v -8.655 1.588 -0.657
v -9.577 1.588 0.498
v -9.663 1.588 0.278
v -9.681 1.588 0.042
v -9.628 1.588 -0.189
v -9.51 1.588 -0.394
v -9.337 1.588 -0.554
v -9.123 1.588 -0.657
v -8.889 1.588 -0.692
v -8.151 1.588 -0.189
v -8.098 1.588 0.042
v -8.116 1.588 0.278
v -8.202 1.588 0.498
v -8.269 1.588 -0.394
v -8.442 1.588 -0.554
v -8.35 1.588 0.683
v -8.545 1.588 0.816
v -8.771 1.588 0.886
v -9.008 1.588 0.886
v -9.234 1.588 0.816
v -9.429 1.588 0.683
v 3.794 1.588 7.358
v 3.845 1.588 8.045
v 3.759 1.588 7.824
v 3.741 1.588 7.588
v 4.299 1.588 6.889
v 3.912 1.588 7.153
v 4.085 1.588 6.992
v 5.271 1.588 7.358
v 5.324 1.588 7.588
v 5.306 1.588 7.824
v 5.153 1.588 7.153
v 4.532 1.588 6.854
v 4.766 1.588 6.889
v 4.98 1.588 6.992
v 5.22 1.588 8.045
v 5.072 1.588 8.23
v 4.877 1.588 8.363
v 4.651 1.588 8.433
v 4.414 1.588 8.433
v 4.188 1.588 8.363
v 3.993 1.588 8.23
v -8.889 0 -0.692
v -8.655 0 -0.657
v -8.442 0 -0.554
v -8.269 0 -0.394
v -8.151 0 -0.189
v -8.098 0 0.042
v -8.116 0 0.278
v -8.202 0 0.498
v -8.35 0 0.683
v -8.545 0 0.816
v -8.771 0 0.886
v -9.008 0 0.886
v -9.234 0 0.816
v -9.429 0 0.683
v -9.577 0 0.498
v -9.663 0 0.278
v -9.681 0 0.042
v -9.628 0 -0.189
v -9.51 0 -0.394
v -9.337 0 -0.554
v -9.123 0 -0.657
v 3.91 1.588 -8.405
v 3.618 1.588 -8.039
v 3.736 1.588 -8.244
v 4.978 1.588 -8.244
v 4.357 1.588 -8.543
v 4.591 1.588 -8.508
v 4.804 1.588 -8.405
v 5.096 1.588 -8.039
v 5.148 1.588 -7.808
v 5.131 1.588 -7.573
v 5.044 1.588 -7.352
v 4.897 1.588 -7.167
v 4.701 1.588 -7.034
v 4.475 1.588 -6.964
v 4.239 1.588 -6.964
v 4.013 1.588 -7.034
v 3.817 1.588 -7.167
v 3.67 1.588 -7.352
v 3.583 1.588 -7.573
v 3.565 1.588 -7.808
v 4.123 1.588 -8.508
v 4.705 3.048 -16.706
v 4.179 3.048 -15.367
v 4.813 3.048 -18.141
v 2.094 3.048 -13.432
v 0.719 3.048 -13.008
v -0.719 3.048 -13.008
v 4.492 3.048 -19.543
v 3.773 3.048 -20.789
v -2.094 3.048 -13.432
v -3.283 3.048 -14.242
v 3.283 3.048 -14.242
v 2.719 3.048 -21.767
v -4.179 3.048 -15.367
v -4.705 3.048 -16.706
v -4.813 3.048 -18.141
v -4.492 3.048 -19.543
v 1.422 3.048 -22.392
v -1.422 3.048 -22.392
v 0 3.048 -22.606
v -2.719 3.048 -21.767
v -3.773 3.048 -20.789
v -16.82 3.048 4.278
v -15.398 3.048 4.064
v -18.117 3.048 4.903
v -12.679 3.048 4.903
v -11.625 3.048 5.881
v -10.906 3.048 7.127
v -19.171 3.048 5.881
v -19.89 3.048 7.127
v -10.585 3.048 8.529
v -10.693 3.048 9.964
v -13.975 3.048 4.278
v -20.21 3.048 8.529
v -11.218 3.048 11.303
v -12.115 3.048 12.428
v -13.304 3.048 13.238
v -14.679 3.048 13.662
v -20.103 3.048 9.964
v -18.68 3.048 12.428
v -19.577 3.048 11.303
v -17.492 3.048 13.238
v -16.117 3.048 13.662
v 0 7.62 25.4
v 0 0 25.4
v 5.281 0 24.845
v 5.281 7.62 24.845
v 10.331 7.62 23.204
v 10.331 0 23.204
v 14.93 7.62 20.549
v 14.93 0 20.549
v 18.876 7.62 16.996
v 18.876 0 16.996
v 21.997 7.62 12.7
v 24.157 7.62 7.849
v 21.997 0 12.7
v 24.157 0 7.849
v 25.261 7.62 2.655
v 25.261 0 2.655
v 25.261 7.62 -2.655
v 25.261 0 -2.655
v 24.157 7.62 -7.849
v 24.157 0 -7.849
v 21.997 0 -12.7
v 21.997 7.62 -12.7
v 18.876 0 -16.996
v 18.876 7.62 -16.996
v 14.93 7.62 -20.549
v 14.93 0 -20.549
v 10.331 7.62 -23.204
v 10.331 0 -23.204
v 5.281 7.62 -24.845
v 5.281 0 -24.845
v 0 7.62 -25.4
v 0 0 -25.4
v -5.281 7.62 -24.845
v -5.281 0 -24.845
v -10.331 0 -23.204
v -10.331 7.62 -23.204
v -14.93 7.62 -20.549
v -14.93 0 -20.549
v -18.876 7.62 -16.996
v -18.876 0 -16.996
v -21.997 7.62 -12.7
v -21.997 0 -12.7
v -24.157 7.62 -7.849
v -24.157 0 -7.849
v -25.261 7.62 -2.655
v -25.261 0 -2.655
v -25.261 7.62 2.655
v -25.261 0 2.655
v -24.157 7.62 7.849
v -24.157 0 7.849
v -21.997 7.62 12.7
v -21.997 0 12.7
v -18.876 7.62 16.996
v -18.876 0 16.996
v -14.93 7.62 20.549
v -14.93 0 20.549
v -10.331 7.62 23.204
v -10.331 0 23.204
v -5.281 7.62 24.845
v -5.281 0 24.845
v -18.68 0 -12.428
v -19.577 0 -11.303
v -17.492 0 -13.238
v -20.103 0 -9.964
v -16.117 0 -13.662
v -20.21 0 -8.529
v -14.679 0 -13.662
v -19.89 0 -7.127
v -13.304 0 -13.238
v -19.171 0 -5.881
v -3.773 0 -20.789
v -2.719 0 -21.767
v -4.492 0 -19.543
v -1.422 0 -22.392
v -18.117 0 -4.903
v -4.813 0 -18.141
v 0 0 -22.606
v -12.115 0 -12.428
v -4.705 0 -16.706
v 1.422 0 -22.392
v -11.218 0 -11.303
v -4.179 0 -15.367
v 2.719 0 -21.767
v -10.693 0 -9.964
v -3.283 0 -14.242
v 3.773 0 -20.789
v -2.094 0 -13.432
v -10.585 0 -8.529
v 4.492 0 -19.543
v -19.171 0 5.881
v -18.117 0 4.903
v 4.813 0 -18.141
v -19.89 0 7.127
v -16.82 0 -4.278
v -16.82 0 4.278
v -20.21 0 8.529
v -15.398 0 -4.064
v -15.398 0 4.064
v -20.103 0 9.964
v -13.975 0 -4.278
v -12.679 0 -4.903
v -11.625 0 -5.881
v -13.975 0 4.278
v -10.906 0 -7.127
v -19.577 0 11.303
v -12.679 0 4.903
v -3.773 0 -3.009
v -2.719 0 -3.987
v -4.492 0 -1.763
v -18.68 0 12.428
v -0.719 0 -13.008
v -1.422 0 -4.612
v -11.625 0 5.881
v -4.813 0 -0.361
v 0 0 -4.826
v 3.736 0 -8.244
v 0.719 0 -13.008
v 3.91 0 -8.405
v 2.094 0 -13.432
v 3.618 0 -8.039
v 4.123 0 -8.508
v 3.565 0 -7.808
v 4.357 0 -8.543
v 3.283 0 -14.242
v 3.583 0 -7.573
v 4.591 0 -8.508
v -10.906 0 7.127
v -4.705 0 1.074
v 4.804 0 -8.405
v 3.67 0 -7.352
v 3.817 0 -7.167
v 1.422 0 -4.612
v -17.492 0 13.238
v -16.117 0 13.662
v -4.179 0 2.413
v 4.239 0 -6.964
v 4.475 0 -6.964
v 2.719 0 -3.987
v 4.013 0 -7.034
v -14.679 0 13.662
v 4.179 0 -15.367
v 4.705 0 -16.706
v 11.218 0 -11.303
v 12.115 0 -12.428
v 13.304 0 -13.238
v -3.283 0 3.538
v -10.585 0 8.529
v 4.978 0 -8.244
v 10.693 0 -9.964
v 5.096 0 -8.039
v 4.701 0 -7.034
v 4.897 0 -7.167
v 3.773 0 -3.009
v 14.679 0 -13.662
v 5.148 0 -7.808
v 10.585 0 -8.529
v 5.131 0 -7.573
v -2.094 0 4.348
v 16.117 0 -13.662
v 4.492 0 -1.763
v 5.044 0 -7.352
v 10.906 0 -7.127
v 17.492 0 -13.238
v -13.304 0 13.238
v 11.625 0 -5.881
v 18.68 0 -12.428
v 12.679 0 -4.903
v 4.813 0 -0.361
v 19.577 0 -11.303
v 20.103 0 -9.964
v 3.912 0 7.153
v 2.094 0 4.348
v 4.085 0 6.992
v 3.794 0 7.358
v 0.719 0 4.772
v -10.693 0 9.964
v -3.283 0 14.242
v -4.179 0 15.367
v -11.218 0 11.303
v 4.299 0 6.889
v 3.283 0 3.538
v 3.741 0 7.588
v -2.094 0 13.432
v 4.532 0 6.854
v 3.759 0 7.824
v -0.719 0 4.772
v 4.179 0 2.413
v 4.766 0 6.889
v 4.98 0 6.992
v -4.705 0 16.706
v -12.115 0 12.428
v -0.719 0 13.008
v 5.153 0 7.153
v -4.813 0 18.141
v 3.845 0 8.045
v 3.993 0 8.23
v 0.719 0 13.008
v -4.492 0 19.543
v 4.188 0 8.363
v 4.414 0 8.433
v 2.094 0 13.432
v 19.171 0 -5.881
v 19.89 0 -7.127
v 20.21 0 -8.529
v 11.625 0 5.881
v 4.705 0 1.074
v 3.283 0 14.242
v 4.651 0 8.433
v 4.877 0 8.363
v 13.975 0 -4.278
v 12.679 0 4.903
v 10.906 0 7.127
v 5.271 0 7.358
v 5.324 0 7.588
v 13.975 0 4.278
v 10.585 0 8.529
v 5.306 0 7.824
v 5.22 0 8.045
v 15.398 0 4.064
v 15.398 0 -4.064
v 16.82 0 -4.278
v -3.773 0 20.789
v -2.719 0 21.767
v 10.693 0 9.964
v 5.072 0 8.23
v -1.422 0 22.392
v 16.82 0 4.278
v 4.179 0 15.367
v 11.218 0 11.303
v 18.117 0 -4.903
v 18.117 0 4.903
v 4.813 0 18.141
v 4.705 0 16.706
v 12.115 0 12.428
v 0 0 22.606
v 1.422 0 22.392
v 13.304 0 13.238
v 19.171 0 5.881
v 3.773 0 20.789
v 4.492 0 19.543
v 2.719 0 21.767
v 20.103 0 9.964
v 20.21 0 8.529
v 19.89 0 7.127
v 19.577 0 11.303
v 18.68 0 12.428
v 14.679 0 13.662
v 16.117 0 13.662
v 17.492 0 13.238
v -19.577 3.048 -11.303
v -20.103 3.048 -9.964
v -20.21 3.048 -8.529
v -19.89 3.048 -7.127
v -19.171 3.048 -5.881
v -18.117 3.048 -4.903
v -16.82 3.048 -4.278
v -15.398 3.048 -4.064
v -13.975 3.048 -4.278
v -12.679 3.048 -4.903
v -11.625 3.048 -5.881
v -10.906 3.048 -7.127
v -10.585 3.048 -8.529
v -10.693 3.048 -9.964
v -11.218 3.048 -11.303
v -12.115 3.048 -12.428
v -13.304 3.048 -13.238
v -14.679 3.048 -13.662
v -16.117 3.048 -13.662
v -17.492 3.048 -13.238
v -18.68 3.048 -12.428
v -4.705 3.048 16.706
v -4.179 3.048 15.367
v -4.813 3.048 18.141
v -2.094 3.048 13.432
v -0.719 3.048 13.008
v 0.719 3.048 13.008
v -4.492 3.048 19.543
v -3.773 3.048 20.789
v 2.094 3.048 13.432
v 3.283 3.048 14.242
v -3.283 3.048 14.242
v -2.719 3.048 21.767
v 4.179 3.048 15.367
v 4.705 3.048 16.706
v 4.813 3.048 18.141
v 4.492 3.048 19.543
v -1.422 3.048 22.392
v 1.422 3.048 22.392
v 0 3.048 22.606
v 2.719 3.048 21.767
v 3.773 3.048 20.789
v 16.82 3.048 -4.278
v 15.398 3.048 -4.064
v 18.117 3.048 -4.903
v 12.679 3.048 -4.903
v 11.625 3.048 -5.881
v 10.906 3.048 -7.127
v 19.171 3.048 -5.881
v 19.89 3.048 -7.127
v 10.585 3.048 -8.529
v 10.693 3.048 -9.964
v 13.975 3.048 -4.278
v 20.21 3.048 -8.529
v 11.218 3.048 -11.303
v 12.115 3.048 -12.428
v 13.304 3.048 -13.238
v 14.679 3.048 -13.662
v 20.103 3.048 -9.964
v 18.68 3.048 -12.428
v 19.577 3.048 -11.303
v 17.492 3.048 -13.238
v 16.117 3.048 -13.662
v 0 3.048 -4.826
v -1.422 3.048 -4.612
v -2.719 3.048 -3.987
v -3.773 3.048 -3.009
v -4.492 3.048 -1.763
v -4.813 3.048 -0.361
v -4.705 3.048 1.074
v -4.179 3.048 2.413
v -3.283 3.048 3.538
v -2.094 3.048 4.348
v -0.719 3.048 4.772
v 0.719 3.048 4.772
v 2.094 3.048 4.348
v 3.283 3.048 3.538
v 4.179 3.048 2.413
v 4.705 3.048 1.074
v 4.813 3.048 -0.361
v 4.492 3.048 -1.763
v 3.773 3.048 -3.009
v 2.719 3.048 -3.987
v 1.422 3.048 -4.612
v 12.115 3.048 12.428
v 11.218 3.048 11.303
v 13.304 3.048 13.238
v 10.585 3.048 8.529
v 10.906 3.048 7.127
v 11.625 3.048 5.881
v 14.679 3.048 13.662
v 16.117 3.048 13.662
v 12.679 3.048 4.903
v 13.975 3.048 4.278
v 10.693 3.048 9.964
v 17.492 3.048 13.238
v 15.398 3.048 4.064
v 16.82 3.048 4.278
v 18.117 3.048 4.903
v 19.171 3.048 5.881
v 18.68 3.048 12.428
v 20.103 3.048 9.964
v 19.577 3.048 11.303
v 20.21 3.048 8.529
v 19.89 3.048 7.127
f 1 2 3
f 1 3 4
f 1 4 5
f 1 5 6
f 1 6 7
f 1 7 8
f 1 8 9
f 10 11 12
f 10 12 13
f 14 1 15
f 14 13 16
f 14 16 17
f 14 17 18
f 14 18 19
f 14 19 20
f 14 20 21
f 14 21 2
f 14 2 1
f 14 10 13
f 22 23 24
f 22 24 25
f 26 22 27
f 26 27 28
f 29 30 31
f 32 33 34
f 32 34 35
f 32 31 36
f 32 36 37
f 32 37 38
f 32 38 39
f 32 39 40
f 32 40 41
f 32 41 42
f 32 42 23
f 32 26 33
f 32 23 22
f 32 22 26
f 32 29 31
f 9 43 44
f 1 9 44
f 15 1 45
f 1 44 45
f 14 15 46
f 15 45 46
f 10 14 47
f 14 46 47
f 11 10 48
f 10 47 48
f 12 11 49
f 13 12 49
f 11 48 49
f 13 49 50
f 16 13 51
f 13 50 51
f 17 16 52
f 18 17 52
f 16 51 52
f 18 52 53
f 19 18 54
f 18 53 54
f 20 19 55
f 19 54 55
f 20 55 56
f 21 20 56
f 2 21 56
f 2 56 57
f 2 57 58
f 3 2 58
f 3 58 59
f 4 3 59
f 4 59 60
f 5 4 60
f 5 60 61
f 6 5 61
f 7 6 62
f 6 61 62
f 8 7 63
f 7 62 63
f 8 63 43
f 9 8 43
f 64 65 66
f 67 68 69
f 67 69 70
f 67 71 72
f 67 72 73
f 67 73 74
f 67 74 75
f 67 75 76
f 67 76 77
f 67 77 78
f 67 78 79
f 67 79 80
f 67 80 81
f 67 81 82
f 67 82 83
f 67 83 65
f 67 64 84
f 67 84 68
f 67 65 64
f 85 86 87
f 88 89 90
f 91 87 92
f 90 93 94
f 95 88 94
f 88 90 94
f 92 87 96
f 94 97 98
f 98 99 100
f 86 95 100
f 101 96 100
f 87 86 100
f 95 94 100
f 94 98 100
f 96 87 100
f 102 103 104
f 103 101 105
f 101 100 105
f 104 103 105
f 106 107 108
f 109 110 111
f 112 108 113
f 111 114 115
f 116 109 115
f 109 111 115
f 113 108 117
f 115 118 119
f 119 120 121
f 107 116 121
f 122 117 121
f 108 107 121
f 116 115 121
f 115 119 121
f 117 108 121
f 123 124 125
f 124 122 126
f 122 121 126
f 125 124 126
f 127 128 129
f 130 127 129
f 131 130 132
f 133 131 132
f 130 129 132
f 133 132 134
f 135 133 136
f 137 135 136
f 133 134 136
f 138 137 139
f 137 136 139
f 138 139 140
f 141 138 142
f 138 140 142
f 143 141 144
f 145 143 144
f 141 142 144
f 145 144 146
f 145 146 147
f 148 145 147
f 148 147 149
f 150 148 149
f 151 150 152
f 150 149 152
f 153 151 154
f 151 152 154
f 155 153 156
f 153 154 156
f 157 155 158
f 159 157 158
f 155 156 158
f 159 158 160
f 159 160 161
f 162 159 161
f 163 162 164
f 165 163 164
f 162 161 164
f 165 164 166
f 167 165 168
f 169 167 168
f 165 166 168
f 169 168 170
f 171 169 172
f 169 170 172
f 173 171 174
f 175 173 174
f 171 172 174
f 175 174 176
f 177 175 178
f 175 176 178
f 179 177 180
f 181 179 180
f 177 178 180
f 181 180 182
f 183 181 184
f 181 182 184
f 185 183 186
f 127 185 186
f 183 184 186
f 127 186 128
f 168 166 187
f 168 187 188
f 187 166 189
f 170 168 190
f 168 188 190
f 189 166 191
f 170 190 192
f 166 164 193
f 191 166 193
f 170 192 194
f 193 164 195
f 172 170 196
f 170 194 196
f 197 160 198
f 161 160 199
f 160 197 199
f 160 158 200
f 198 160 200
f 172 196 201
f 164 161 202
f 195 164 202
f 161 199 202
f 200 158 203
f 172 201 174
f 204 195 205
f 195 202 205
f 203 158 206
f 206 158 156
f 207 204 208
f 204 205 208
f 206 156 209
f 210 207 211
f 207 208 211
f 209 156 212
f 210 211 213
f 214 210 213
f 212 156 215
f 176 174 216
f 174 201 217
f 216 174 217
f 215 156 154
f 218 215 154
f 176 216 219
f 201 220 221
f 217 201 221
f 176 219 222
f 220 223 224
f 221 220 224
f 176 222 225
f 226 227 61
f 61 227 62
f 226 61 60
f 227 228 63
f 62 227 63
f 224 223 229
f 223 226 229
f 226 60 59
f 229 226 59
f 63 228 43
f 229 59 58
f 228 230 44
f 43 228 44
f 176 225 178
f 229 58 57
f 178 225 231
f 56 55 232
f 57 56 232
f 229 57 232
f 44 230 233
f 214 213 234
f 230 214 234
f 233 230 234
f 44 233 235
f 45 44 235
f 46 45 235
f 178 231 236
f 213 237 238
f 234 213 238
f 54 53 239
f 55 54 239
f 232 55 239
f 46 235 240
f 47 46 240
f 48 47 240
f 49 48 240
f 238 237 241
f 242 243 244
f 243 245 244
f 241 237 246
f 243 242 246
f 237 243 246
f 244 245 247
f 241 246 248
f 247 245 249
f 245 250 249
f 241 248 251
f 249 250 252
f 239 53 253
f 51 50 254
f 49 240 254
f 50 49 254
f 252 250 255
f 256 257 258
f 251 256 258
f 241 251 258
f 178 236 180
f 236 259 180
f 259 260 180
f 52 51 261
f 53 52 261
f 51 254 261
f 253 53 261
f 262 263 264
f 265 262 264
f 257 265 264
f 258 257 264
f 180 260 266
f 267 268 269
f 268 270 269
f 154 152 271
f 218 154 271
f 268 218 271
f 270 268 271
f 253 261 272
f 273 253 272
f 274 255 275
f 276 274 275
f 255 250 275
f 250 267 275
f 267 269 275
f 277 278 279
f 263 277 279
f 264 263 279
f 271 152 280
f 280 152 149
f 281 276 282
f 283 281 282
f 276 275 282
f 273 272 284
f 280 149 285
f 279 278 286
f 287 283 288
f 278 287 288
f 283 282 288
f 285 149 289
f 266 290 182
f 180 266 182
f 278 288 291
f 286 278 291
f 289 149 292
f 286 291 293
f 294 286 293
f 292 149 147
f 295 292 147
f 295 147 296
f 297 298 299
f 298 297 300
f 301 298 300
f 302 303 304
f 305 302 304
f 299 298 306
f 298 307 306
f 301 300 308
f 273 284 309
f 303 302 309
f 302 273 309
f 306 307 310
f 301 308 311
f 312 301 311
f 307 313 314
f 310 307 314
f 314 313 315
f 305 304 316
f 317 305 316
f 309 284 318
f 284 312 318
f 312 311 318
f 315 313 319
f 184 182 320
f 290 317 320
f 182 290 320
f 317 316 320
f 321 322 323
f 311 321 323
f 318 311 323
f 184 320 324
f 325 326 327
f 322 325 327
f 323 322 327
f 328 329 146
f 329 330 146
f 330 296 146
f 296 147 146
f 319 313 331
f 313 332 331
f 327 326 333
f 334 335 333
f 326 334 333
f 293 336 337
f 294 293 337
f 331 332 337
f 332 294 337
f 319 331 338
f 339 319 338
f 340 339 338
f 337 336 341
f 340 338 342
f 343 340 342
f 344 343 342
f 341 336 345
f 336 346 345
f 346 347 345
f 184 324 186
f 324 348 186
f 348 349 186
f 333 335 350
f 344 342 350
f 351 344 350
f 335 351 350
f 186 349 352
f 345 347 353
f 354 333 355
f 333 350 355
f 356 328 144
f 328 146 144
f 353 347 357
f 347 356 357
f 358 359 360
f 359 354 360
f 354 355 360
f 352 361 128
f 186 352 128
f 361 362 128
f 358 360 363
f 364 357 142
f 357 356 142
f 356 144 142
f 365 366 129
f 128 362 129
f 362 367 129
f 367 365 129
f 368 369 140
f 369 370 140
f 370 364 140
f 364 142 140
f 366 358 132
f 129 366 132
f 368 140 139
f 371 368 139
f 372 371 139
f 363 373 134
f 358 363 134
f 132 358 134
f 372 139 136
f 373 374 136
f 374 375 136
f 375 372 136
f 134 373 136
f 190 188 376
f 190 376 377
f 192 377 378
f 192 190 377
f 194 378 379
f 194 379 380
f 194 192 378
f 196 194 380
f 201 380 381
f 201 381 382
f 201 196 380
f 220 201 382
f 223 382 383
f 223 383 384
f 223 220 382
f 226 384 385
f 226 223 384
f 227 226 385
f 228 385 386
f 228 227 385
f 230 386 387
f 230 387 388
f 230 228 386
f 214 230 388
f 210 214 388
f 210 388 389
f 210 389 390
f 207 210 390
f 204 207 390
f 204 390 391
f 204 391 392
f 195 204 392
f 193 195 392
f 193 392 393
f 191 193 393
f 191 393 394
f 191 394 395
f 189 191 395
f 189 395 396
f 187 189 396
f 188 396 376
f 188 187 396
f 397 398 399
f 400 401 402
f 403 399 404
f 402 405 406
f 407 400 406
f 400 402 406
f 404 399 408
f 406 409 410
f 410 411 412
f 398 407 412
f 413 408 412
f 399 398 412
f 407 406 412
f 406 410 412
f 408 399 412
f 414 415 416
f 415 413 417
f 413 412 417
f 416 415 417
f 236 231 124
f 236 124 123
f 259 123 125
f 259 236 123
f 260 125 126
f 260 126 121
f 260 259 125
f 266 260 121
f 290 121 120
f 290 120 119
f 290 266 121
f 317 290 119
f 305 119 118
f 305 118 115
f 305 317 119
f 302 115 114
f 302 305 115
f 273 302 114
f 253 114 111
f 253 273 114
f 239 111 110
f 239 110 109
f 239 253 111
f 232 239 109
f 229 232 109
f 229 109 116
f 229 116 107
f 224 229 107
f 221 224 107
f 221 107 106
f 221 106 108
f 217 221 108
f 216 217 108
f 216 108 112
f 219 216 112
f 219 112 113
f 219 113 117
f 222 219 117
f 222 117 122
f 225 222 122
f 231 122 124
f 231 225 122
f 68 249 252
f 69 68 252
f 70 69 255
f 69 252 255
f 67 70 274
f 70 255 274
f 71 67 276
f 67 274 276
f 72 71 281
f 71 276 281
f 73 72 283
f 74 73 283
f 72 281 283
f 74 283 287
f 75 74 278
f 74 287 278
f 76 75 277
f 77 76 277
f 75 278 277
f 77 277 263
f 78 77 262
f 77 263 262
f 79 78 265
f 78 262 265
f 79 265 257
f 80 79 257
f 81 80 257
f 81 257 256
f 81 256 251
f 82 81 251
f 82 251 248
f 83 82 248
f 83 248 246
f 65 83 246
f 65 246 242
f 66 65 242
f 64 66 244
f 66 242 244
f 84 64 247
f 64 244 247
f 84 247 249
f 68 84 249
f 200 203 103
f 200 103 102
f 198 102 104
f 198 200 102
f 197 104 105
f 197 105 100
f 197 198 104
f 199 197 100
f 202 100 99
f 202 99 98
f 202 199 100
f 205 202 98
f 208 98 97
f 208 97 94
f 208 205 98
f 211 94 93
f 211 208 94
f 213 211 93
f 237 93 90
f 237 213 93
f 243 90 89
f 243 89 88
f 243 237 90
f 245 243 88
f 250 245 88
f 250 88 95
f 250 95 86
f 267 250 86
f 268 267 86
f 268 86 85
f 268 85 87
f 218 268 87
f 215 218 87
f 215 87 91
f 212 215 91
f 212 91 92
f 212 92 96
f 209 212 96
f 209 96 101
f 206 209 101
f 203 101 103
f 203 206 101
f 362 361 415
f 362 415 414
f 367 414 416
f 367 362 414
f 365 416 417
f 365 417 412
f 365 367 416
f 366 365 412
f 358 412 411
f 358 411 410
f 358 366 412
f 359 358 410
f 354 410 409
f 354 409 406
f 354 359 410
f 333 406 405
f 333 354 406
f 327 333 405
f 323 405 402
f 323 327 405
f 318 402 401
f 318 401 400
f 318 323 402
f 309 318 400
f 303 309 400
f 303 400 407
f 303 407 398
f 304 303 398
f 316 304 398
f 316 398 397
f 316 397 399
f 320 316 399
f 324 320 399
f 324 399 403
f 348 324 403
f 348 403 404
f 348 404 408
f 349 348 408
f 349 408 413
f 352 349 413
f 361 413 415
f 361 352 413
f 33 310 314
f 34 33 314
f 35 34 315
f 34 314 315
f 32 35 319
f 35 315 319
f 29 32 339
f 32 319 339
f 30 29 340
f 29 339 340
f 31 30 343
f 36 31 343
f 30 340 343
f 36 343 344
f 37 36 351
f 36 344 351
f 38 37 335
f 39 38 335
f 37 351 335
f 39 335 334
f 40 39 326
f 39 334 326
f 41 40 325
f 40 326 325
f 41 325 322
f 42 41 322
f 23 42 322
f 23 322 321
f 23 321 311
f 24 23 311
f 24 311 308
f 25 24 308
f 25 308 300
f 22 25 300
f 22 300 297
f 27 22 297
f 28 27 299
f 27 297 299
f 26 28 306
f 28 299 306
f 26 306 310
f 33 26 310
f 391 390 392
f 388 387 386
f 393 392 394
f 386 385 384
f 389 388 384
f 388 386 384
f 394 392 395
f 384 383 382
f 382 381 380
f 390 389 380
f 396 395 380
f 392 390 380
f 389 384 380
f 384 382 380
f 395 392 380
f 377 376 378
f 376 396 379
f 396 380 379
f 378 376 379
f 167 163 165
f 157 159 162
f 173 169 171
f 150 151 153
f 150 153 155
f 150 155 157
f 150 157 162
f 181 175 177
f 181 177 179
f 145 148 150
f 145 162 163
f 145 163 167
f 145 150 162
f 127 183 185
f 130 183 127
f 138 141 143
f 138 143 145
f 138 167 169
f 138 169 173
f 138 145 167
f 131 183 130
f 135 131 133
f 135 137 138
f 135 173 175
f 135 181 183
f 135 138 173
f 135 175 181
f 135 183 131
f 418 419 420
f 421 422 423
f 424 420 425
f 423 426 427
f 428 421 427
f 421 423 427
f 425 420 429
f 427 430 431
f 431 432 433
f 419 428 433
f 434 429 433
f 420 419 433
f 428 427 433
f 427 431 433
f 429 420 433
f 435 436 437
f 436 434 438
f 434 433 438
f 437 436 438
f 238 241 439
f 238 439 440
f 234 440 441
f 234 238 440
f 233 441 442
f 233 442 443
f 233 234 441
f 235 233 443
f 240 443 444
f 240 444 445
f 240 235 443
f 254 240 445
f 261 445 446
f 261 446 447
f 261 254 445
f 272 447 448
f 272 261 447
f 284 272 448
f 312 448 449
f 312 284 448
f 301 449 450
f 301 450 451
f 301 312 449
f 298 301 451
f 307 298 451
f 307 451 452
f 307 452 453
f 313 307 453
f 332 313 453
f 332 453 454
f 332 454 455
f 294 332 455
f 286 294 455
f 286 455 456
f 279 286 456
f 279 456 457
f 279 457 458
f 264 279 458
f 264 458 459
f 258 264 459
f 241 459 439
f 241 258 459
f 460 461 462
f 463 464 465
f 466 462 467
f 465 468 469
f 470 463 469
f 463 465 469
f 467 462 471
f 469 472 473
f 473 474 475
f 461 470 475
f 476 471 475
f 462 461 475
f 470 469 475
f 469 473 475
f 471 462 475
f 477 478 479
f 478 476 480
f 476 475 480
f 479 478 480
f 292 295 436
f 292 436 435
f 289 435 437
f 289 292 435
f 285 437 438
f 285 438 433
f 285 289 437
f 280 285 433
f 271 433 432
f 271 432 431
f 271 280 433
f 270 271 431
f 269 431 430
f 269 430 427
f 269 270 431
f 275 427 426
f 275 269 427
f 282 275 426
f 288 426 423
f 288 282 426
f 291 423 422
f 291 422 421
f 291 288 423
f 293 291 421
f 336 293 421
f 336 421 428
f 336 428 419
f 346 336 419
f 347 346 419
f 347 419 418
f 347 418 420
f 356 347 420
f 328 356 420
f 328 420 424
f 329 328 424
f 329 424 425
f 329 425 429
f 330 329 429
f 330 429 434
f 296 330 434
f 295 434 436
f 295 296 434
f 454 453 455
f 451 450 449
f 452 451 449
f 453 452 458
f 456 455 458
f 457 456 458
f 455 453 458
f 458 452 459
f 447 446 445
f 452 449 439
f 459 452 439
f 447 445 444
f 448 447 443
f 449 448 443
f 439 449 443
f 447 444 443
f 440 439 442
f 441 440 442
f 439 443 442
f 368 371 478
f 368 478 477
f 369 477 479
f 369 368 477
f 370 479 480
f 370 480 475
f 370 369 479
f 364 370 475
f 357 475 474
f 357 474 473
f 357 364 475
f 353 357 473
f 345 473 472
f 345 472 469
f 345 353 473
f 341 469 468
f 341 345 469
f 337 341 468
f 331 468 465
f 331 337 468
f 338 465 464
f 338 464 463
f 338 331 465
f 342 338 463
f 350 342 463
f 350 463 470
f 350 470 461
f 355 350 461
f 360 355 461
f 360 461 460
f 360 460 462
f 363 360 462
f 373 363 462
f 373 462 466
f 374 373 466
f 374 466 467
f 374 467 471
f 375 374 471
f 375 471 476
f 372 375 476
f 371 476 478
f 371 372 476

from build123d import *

# Parameters (mm, degrees)
SKETCH1_R           = 25.4
BOSS_EXTRUDE2_DEPTH = 7.62
SKETCH4_R           = 4.826
CUT_EXTRUDE2_DEPTH  = 3.048
CIRPATTERN1_COUNT   = 6
SKETCH5_R           = 4.826
CUT_EXTRUDE6_DEPTH  = 3.048
SKETCH7_R           = 0.79375
CUT_EXTRUDE7_DEPTH  = 1.5875


with BuildPart() as part:
    # Sketch1 → Boss-Extrude2 (new body)
    with BuildSketch(Plane(origin=(0, 0, 0), x_dir=(1, 0, 0), z_dir=(0, 1, 0))):
        with Locations(Location((0, 0, 0), (0, 0, 270))):
            Circle(SKETCH1_R)
    extrude(amount=BOSS_EXTRUDE2_DEPTH)

    # Sketch4 → Cut-Extrude2 (cut)
    with BuildSketch(Plane(origin=(0, 0, 0), x_dir=(1, 0, 0), z_dir=(0, 1, 0))):
        with Locations(Location((0, 17.78, 0), (0, 0, 90))):
            Circle(SKETCH4_R)
    cut_extrude2 = extrude(amount=CUT_EXTRUDE2_DEPTH, mode=Mode.SUBTRACT)

    # CirPattern1: Cut-Extrude2 ×6 about axis
    cirpattern1_axis = Axis((0, 0, 0), (0, 1, 0))
    for i in range(1, CIRPATTERN1_COUNT):
        add(cut_extrude2.rotate(cirpattern1_axis, i * 360 / CIRPATTERN1_COUNT), mode=Mode.SUBTRACT)

    # Sketch5 → Cut-Extrude6 (cut)
    with BuildSketch(Plane(origin=(0, 0, 0), x_dir=(1, 0, 0), z_dir=(0, 1, 0))):
        with Locations(Location((0, 0, 0), (0, 0, 90))):
            Circle(SKETCH5_R)
    extrude(amount=CUT_EXTRUDE6_DEPTH, mode=Mode.SUBTRACT)

    # Sketch7 → Cut-Extrude7 (cut)
    with BuildSketch(Plane.XZ):
        with Locations(Location((4.532486744, 7.647788172, 0), (0, 0, 270))):
            Circle(SKETCH7_R)
        with Locations(Location((4.356935467, -7.749142748, 0), (0, 0, 270))):
            Circle(SKETCH7_R)
        with Locations(Location((-8.889422211, 0.101354577, 0), (0, 0, 270))):
            Circle(SKETCH7_R)
    extrude(amount=-CUT_EXTRUDE7_DEPTH, mode=Mode.SUBTRACT)


solid = part.part
